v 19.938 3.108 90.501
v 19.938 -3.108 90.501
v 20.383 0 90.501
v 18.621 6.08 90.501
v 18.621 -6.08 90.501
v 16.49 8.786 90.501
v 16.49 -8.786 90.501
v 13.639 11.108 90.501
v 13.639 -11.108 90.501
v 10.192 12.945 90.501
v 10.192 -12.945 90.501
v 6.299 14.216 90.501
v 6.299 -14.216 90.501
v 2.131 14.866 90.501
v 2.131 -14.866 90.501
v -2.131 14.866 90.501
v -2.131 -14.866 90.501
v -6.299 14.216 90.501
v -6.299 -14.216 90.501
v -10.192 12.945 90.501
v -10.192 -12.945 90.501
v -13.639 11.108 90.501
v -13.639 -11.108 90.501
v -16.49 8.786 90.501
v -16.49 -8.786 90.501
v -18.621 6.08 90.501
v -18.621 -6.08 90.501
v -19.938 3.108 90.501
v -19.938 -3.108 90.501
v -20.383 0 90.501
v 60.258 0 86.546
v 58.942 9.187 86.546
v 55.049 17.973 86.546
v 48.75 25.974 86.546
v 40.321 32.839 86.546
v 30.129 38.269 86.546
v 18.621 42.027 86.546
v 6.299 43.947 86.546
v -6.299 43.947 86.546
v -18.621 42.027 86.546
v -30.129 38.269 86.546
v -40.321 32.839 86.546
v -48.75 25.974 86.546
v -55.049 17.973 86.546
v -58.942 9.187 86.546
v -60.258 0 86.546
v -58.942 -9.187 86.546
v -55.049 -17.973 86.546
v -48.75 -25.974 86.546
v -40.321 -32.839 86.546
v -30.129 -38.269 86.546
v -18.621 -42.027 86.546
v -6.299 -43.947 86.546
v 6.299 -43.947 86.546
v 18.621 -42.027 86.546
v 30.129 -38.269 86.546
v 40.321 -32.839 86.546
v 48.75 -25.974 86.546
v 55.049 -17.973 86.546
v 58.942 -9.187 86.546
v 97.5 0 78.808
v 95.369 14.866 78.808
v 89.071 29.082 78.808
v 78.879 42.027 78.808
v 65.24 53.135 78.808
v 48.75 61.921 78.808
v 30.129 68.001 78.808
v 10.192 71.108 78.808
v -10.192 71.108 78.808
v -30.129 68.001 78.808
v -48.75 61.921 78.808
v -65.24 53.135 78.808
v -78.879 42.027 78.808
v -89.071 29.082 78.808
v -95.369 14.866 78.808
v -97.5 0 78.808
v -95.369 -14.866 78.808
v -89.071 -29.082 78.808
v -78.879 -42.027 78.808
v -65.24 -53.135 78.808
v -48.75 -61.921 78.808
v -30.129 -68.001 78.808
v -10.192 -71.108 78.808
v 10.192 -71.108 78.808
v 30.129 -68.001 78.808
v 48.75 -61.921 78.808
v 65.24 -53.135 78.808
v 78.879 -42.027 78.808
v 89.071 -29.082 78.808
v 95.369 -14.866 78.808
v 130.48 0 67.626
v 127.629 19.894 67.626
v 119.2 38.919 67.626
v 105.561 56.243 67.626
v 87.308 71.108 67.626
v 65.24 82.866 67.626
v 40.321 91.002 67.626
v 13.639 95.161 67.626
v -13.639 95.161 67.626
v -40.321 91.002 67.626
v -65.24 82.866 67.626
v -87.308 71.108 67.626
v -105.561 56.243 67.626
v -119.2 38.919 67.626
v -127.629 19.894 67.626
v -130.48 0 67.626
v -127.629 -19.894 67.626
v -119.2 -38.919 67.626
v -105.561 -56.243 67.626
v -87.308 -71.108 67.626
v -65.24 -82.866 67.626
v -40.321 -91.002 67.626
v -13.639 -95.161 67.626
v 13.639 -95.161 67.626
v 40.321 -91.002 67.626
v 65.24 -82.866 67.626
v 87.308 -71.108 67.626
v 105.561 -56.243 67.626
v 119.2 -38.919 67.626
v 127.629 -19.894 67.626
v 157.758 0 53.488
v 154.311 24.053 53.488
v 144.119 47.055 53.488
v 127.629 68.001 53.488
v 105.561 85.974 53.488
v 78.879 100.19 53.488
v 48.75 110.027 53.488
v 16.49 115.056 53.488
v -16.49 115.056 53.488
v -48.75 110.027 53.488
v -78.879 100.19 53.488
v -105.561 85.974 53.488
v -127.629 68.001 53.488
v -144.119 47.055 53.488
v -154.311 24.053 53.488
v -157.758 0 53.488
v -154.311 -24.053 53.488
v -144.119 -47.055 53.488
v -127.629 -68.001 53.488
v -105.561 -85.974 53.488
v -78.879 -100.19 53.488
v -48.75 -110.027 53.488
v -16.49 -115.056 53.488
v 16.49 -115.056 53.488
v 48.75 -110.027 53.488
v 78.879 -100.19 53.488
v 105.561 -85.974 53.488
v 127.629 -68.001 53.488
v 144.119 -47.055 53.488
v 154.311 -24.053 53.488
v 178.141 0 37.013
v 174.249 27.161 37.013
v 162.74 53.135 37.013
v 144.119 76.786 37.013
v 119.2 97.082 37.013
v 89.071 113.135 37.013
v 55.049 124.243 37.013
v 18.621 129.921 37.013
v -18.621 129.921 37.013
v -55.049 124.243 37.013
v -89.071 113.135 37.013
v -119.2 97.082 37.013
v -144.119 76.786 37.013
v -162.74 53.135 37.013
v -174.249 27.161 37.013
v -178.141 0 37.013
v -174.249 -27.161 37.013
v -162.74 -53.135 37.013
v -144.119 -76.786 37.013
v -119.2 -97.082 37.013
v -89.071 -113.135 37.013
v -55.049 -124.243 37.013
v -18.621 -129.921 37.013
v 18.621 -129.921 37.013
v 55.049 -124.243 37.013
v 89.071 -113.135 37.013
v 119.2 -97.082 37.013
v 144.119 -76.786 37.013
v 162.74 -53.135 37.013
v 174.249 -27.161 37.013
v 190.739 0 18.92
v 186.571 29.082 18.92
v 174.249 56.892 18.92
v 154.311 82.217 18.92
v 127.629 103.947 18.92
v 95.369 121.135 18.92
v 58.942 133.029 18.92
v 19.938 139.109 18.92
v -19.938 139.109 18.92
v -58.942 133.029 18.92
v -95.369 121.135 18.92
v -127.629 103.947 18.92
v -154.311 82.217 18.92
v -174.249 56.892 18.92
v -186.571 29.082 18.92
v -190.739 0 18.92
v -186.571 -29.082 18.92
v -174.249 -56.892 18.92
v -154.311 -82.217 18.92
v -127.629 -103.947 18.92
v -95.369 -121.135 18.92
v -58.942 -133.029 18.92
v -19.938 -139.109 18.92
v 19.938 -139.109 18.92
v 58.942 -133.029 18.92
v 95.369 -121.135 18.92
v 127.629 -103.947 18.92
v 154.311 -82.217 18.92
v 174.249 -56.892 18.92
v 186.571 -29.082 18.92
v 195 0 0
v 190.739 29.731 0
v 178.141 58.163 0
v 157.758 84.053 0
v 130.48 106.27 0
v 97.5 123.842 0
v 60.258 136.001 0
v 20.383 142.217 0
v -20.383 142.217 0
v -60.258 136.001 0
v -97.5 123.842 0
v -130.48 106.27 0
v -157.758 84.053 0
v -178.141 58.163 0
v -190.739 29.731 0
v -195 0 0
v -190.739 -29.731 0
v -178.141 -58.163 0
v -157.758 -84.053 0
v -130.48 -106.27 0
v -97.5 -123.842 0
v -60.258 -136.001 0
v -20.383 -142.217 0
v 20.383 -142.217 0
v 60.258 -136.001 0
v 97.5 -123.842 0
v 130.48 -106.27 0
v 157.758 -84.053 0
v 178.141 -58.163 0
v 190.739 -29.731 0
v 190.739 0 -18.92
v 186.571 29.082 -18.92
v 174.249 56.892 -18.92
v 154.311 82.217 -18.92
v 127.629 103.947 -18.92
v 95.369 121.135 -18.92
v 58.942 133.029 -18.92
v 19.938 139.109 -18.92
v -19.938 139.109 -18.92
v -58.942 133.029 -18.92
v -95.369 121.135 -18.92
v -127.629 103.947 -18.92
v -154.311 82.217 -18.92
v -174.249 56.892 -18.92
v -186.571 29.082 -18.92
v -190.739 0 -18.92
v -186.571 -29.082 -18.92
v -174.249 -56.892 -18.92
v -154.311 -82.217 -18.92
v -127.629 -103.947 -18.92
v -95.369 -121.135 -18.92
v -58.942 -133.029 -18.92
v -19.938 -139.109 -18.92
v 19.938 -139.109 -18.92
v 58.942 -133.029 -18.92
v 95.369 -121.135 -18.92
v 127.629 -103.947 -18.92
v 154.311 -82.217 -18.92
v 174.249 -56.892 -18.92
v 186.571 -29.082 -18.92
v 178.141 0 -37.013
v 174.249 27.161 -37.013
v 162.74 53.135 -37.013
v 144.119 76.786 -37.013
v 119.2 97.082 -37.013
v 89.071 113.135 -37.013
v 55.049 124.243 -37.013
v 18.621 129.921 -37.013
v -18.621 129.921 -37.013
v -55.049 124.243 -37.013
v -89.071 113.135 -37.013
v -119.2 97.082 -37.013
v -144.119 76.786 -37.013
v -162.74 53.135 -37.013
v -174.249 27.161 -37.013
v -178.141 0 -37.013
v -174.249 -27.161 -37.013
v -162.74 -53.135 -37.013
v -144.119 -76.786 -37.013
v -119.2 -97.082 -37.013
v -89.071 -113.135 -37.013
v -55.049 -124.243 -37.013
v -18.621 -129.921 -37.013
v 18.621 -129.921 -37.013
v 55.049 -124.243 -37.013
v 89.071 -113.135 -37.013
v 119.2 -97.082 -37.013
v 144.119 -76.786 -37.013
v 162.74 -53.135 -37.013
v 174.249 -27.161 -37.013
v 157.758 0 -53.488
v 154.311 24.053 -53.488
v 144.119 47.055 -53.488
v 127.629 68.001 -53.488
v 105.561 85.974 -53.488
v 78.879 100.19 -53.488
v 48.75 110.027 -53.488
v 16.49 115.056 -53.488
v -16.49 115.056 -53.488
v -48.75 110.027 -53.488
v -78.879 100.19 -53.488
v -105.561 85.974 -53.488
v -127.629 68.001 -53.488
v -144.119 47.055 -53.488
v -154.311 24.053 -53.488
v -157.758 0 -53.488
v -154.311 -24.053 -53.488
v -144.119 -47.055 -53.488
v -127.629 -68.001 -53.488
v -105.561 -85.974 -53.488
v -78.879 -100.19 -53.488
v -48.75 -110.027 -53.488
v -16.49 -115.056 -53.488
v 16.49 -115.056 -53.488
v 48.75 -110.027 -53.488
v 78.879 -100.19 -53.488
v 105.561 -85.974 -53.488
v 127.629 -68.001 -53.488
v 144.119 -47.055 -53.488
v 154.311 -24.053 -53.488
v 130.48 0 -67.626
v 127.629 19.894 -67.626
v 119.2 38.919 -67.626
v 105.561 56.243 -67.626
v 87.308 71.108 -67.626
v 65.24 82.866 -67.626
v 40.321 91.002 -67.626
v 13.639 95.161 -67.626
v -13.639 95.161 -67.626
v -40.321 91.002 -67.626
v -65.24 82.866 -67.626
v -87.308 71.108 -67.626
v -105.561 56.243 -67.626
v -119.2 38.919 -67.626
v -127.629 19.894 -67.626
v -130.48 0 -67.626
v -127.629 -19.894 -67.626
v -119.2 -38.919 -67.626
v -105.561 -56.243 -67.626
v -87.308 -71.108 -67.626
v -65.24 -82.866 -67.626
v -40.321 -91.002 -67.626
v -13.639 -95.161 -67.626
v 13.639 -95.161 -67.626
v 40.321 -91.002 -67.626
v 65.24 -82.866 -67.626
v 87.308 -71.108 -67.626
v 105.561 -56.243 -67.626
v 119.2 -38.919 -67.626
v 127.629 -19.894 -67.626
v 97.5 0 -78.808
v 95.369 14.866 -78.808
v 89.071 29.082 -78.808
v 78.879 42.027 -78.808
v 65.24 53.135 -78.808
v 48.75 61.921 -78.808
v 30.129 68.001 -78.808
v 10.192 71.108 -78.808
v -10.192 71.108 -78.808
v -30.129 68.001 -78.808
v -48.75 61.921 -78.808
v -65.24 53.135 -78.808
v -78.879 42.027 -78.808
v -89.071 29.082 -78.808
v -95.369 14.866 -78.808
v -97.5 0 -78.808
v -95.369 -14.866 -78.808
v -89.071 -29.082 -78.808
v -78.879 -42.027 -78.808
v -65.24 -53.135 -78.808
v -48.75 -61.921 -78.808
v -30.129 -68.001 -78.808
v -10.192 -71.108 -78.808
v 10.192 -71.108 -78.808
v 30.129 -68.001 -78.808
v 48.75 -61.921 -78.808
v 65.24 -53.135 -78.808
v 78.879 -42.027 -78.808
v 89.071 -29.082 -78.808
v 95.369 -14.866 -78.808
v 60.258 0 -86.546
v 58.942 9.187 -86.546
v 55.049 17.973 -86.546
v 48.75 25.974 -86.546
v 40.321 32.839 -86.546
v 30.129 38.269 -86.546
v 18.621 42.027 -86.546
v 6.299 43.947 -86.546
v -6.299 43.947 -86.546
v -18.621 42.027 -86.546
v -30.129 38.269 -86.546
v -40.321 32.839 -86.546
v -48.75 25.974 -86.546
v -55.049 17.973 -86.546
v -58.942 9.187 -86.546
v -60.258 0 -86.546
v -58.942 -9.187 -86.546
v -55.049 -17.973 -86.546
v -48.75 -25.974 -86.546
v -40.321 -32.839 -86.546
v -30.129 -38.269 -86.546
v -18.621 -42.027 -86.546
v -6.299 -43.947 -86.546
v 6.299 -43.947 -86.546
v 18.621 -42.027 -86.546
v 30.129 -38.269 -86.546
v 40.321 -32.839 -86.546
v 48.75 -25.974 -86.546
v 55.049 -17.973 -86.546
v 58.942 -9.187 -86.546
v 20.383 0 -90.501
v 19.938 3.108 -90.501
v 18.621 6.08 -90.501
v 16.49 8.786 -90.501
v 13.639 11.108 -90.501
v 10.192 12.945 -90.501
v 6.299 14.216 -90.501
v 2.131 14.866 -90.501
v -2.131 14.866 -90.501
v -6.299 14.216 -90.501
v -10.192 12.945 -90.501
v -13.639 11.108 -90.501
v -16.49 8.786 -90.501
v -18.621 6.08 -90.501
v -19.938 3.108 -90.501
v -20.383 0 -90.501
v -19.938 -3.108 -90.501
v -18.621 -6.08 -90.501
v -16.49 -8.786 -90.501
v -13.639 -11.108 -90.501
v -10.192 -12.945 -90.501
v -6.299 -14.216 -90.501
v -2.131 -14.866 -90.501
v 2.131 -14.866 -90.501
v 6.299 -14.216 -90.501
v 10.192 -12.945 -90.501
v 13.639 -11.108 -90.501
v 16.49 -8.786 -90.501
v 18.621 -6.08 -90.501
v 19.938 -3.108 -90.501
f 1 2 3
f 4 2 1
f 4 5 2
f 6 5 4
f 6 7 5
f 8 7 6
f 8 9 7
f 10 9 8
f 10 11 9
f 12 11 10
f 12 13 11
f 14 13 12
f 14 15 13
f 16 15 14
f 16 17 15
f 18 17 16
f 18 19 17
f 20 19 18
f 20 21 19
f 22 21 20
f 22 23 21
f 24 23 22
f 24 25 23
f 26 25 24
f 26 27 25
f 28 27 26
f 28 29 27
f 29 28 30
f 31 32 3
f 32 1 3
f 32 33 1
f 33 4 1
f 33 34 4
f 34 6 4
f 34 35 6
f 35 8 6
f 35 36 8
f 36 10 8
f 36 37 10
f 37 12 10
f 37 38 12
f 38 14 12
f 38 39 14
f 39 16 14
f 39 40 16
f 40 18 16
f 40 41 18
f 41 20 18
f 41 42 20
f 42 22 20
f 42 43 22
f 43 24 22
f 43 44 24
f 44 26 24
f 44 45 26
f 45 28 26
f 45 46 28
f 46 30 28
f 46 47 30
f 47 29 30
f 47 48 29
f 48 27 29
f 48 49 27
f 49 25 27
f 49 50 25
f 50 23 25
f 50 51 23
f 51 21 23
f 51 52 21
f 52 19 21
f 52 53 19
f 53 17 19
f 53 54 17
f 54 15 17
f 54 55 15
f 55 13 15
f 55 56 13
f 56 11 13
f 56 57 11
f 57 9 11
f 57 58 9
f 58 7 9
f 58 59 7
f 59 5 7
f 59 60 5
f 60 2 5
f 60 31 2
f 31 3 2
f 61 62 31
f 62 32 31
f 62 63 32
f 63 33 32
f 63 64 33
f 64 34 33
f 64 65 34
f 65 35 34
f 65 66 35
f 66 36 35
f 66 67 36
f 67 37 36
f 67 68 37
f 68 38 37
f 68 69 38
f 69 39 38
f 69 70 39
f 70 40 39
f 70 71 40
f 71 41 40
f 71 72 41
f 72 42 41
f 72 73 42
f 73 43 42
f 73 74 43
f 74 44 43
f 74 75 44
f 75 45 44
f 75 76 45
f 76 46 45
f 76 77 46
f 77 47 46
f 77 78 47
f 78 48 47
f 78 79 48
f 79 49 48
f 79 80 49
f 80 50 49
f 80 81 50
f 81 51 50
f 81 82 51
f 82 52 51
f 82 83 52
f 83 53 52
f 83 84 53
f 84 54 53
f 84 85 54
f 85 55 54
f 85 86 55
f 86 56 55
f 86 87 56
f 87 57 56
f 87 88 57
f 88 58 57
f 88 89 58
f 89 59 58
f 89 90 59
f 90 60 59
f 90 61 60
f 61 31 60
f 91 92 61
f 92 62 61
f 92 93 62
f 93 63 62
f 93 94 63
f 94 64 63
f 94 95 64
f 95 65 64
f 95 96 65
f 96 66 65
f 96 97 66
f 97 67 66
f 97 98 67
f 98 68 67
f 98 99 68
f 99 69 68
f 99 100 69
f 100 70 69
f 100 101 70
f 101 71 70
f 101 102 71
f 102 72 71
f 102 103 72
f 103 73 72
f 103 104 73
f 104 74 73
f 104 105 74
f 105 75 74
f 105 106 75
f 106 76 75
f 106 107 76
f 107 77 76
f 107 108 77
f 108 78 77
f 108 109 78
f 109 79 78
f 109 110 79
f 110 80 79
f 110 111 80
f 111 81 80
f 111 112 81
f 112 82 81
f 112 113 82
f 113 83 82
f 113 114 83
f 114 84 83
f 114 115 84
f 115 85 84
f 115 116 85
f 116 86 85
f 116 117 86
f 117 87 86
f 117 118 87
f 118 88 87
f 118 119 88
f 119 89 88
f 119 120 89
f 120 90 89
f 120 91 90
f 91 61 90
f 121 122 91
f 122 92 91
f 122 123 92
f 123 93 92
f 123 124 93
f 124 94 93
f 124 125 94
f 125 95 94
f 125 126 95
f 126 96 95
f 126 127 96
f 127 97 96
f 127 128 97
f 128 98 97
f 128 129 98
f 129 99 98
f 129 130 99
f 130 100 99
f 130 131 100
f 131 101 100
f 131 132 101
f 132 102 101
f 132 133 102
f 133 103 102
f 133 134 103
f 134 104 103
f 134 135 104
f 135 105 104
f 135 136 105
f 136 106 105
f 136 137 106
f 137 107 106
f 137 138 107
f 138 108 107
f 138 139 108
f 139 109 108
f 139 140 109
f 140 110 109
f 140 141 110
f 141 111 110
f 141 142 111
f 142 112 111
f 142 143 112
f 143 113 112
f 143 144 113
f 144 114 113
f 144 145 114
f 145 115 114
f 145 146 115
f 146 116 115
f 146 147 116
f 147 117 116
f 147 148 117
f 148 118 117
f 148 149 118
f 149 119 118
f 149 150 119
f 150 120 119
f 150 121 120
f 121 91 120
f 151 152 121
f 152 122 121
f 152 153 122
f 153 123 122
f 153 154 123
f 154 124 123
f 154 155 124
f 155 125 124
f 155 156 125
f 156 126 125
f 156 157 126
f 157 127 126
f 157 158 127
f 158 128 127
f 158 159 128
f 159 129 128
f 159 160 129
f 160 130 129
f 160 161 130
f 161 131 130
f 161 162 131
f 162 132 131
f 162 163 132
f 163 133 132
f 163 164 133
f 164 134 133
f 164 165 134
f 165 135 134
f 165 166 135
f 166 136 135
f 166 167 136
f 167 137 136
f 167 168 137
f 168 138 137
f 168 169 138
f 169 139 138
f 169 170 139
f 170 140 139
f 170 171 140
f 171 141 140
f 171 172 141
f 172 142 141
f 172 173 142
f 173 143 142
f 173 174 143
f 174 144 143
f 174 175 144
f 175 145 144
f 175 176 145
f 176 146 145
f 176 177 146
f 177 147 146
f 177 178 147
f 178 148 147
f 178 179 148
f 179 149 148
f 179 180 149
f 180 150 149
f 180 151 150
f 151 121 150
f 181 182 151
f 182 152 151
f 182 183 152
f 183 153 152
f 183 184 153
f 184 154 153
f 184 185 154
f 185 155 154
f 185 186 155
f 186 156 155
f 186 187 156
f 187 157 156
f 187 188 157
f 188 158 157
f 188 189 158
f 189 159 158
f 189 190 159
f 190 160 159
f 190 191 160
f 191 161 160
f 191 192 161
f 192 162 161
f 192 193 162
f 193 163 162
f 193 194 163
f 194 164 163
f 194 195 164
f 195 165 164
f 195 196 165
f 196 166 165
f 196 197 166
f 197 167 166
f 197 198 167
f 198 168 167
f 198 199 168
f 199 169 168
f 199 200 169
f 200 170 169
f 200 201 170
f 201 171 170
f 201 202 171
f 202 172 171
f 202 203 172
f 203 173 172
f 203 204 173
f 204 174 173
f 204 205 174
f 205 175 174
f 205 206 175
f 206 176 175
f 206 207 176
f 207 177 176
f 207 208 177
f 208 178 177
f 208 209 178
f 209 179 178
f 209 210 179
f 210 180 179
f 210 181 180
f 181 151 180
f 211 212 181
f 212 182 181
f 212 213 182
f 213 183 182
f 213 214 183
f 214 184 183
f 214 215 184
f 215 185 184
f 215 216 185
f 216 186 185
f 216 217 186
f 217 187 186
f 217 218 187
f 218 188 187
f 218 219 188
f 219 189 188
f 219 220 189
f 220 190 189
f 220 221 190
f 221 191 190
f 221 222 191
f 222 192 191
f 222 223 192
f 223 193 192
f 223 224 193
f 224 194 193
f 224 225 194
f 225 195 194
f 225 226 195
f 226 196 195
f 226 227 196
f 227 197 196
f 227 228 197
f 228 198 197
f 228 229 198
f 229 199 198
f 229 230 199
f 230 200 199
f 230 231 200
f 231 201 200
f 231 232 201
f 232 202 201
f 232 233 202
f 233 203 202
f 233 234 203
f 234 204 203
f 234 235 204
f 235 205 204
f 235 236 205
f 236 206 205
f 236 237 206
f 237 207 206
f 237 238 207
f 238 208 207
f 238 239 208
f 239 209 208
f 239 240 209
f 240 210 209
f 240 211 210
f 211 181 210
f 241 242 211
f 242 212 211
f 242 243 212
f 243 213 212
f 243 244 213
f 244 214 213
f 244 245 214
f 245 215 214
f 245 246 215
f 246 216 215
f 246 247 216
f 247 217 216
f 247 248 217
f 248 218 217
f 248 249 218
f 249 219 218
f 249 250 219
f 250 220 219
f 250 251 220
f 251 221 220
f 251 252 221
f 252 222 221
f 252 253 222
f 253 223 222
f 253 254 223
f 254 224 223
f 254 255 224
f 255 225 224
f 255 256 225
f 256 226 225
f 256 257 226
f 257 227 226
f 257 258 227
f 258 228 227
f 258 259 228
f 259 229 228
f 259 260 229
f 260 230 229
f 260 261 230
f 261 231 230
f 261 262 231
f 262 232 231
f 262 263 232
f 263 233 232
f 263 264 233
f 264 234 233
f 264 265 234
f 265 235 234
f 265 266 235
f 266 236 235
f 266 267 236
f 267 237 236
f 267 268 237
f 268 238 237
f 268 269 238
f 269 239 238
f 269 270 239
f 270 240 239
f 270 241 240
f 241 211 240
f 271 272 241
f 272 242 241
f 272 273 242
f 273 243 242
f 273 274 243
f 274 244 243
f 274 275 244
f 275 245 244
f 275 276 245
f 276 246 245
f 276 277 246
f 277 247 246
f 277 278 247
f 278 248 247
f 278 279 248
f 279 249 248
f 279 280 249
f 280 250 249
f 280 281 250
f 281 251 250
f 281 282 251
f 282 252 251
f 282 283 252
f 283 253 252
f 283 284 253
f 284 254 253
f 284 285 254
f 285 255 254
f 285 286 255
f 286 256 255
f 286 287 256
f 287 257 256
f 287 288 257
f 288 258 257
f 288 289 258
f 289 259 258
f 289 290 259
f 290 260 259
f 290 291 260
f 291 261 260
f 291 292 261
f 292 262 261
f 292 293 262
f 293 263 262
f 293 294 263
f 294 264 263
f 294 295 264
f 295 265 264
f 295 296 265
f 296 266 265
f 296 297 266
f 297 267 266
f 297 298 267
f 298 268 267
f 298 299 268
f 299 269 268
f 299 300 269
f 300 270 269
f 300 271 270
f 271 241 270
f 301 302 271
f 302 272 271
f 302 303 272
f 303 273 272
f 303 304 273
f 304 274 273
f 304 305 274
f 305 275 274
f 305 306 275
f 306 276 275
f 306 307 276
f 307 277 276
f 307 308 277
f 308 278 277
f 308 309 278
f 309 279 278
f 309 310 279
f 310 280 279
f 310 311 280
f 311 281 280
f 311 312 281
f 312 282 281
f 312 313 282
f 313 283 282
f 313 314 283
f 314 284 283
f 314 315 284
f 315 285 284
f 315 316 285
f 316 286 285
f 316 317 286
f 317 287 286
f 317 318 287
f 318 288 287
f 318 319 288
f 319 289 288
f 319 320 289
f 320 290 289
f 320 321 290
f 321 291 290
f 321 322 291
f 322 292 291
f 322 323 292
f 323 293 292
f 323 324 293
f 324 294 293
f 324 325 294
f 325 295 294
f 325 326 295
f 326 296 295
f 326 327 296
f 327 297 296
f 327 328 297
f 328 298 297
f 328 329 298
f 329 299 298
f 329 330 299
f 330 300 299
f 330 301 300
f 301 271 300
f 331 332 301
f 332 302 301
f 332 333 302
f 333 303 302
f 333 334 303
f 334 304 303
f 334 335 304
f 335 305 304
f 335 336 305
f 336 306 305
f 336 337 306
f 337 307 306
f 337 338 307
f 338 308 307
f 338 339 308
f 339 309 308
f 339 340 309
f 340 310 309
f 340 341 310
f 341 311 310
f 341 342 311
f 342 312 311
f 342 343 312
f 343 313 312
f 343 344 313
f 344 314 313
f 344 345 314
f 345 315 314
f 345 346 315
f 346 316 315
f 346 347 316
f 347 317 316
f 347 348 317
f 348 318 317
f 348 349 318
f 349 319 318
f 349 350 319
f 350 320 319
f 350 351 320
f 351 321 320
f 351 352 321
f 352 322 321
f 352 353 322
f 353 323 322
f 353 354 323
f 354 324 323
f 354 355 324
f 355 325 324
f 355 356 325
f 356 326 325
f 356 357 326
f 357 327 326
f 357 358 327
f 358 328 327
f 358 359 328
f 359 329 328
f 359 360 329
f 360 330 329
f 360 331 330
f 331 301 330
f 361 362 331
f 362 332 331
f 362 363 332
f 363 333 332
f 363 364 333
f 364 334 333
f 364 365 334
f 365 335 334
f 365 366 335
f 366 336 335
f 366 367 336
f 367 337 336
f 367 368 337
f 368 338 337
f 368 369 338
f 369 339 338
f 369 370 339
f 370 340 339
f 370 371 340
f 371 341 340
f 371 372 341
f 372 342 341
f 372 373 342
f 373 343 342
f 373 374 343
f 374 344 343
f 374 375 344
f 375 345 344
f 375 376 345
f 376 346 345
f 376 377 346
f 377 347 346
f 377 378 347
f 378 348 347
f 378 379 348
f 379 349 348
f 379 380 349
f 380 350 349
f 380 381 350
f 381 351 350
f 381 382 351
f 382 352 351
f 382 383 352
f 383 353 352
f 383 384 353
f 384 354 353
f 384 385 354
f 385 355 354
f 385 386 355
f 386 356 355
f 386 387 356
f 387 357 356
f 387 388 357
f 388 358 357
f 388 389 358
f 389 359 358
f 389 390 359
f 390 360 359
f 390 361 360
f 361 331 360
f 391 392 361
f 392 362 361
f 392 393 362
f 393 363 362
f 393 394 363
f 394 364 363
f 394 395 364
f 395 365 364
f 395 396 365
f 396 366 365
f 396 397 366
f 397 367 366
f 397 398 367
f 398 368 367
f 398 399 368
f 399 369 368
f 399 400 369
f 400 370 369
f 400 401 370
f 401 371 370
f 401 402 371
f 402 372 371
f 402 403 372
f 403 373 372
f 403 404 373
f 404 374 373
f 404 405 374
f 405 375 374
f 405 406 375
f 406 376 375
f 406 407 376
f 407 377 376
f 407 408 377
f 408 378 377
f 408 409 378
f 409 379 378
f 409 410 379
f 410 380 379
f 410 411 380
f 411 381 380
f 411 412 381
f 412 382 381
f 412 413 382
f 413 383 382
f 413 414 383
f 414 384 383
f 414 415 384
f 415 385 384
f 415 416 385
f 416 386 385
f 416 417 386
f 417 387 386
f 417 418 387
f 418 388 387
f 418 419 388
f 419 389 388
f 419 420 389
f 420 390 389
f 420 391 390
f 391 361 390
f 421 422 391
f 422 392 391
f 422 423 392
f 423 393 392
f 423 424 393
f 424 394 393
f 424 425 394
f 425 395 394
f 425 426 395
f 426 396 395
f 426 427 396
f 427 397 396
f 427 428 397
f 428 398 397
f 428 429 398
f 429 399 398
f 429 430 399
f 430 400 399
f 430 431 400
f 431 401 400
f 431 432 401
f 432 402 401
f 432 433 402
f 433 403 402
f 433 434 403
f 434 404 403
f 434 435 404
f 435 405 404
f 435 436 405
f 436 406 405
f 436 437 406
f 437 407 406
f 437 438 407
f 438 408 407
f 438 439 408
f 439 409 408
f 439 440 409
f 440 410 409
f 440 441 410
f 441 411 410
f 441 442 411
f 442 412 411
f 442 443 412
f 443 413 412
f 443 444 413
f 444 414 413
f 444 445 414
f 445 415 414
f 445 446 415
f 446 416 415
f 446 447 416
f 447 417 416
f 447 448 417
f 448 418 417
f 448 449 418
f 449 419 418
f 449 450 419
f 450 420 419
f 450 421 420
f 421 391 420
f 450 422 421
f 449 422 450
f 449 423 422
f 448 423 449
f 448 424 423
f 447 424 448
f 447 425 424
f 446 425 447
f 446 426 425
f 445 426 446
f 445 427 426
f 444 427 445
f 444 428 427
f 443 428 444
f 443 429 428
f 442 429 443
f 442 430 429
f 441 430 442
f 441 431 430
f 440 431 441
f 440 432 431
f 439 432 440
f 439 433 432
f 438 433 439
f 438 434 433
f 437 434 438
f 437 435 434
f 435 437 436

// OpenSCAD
// Generated by SolidPython 1.0.1 on 2020-07-29 00:46:52


scale(v = [15, 11, 7]) {
	sphere(r = 13);
}
/***********************************************
*********      SolidPython code:      **********
************************************************
 
# import packages: SolidPython
from solid import *
from solid.utils import *
from itertools import chain, combinations, permutations


class Resize:

    def __init__(self, scad_file):
        self.scad_file = scad_file
        #self.scad_file = import_scad(scad_file)
        # cone/cylinder param:
        self.r1 = 0
        self.r2 = 0
        self.h = 0
        # rectangular prism param:
        self.w = 0
        self.l = 0
        # ellipse param:
        self.r = 0

    # import OpenScad code (file name corresponds to shape)


    # classify shape + parameters
    def assign(self, param1, param2, param3):
        if self.scad_file == 'cone.scad':
            self.r1 = param1
            self.r2 = param2
            self.h = param3
        elif self.scad_file == 'cylinder.scad':
            self.r1 = param1
            self.r2 = param2
            self.h = param3
        elif self.scad_file == 'rectangularPrism.scad':
            self.h = param1
            self.l = param2
            self.w = param3
        else:
            self.r = param1
            self.h = param2

    # resize parameters
    def iterate(self):
        x = range(3, 20, 2)
        i = 1
        if self.scad_file == 'cone.scad':
            tempList = list(permutations(x, 2))
            for temp in tempList:
                param1 = temp[0]
                param2 = temp[1]
                filepath = 'produced_scad_files/' + 'cone' + str(param1) + '_' + str(param2) + '_' + '.scad'
                scad_render_to_file(cylinder(h=param1, r1=param2, r2=0), filepath)

        elif self.scad_file == 'cylinder.scad':
            tempList = list(permutations(x, 3))
            for temp in tempList:
                param1 = temp[0]
                param2 = temp[1]
                filepath = 'produced_scad_files/' + 'cylinder' + str(param1) + '_' + str(param2) + '_' + '.scad'
                scad_render_to_file(cylinder(h=param1, r1=param2, r2=param2), filepath)

        elif self.scad_file == 'rectangularPrism.scad':
            tempList = list(permutations(x, 3))
            for temp in tempList:
                param1 = temp[0]
                param2 = temp[1]
                param3 = temp[2]
                filepath = 'produced_scad_files/' + 'rectangularPrism' + str(param1) + '_' + str(param2) + '_' + str(
                    param3) + '.scad'
                scad_render_to_file(cube(size=(param1, param2, param3)), filepath)

        elif self.scad_file == 'ellipse.scad':
            tempList = list(permutations(x, 4))
            for temp in tempList:
                param1 = temp[0]
                param2 = temp[1]
                param3 = temp[2]
                param4 = temp[3]
                filepath = 'produced_scad_files/' + 'ellipse' + str(param1) + '_' + str(param2) + '_' + str(param3) + '_' + str(param4) + '.scad'
                scad_render_to_file(scale([param1, param2, param3])(sphere(r=param4)), filepath)

    def render_to_scadfile(self):
        scad_render_to_file(scad, 'example.scad') 
 
************************************************/
